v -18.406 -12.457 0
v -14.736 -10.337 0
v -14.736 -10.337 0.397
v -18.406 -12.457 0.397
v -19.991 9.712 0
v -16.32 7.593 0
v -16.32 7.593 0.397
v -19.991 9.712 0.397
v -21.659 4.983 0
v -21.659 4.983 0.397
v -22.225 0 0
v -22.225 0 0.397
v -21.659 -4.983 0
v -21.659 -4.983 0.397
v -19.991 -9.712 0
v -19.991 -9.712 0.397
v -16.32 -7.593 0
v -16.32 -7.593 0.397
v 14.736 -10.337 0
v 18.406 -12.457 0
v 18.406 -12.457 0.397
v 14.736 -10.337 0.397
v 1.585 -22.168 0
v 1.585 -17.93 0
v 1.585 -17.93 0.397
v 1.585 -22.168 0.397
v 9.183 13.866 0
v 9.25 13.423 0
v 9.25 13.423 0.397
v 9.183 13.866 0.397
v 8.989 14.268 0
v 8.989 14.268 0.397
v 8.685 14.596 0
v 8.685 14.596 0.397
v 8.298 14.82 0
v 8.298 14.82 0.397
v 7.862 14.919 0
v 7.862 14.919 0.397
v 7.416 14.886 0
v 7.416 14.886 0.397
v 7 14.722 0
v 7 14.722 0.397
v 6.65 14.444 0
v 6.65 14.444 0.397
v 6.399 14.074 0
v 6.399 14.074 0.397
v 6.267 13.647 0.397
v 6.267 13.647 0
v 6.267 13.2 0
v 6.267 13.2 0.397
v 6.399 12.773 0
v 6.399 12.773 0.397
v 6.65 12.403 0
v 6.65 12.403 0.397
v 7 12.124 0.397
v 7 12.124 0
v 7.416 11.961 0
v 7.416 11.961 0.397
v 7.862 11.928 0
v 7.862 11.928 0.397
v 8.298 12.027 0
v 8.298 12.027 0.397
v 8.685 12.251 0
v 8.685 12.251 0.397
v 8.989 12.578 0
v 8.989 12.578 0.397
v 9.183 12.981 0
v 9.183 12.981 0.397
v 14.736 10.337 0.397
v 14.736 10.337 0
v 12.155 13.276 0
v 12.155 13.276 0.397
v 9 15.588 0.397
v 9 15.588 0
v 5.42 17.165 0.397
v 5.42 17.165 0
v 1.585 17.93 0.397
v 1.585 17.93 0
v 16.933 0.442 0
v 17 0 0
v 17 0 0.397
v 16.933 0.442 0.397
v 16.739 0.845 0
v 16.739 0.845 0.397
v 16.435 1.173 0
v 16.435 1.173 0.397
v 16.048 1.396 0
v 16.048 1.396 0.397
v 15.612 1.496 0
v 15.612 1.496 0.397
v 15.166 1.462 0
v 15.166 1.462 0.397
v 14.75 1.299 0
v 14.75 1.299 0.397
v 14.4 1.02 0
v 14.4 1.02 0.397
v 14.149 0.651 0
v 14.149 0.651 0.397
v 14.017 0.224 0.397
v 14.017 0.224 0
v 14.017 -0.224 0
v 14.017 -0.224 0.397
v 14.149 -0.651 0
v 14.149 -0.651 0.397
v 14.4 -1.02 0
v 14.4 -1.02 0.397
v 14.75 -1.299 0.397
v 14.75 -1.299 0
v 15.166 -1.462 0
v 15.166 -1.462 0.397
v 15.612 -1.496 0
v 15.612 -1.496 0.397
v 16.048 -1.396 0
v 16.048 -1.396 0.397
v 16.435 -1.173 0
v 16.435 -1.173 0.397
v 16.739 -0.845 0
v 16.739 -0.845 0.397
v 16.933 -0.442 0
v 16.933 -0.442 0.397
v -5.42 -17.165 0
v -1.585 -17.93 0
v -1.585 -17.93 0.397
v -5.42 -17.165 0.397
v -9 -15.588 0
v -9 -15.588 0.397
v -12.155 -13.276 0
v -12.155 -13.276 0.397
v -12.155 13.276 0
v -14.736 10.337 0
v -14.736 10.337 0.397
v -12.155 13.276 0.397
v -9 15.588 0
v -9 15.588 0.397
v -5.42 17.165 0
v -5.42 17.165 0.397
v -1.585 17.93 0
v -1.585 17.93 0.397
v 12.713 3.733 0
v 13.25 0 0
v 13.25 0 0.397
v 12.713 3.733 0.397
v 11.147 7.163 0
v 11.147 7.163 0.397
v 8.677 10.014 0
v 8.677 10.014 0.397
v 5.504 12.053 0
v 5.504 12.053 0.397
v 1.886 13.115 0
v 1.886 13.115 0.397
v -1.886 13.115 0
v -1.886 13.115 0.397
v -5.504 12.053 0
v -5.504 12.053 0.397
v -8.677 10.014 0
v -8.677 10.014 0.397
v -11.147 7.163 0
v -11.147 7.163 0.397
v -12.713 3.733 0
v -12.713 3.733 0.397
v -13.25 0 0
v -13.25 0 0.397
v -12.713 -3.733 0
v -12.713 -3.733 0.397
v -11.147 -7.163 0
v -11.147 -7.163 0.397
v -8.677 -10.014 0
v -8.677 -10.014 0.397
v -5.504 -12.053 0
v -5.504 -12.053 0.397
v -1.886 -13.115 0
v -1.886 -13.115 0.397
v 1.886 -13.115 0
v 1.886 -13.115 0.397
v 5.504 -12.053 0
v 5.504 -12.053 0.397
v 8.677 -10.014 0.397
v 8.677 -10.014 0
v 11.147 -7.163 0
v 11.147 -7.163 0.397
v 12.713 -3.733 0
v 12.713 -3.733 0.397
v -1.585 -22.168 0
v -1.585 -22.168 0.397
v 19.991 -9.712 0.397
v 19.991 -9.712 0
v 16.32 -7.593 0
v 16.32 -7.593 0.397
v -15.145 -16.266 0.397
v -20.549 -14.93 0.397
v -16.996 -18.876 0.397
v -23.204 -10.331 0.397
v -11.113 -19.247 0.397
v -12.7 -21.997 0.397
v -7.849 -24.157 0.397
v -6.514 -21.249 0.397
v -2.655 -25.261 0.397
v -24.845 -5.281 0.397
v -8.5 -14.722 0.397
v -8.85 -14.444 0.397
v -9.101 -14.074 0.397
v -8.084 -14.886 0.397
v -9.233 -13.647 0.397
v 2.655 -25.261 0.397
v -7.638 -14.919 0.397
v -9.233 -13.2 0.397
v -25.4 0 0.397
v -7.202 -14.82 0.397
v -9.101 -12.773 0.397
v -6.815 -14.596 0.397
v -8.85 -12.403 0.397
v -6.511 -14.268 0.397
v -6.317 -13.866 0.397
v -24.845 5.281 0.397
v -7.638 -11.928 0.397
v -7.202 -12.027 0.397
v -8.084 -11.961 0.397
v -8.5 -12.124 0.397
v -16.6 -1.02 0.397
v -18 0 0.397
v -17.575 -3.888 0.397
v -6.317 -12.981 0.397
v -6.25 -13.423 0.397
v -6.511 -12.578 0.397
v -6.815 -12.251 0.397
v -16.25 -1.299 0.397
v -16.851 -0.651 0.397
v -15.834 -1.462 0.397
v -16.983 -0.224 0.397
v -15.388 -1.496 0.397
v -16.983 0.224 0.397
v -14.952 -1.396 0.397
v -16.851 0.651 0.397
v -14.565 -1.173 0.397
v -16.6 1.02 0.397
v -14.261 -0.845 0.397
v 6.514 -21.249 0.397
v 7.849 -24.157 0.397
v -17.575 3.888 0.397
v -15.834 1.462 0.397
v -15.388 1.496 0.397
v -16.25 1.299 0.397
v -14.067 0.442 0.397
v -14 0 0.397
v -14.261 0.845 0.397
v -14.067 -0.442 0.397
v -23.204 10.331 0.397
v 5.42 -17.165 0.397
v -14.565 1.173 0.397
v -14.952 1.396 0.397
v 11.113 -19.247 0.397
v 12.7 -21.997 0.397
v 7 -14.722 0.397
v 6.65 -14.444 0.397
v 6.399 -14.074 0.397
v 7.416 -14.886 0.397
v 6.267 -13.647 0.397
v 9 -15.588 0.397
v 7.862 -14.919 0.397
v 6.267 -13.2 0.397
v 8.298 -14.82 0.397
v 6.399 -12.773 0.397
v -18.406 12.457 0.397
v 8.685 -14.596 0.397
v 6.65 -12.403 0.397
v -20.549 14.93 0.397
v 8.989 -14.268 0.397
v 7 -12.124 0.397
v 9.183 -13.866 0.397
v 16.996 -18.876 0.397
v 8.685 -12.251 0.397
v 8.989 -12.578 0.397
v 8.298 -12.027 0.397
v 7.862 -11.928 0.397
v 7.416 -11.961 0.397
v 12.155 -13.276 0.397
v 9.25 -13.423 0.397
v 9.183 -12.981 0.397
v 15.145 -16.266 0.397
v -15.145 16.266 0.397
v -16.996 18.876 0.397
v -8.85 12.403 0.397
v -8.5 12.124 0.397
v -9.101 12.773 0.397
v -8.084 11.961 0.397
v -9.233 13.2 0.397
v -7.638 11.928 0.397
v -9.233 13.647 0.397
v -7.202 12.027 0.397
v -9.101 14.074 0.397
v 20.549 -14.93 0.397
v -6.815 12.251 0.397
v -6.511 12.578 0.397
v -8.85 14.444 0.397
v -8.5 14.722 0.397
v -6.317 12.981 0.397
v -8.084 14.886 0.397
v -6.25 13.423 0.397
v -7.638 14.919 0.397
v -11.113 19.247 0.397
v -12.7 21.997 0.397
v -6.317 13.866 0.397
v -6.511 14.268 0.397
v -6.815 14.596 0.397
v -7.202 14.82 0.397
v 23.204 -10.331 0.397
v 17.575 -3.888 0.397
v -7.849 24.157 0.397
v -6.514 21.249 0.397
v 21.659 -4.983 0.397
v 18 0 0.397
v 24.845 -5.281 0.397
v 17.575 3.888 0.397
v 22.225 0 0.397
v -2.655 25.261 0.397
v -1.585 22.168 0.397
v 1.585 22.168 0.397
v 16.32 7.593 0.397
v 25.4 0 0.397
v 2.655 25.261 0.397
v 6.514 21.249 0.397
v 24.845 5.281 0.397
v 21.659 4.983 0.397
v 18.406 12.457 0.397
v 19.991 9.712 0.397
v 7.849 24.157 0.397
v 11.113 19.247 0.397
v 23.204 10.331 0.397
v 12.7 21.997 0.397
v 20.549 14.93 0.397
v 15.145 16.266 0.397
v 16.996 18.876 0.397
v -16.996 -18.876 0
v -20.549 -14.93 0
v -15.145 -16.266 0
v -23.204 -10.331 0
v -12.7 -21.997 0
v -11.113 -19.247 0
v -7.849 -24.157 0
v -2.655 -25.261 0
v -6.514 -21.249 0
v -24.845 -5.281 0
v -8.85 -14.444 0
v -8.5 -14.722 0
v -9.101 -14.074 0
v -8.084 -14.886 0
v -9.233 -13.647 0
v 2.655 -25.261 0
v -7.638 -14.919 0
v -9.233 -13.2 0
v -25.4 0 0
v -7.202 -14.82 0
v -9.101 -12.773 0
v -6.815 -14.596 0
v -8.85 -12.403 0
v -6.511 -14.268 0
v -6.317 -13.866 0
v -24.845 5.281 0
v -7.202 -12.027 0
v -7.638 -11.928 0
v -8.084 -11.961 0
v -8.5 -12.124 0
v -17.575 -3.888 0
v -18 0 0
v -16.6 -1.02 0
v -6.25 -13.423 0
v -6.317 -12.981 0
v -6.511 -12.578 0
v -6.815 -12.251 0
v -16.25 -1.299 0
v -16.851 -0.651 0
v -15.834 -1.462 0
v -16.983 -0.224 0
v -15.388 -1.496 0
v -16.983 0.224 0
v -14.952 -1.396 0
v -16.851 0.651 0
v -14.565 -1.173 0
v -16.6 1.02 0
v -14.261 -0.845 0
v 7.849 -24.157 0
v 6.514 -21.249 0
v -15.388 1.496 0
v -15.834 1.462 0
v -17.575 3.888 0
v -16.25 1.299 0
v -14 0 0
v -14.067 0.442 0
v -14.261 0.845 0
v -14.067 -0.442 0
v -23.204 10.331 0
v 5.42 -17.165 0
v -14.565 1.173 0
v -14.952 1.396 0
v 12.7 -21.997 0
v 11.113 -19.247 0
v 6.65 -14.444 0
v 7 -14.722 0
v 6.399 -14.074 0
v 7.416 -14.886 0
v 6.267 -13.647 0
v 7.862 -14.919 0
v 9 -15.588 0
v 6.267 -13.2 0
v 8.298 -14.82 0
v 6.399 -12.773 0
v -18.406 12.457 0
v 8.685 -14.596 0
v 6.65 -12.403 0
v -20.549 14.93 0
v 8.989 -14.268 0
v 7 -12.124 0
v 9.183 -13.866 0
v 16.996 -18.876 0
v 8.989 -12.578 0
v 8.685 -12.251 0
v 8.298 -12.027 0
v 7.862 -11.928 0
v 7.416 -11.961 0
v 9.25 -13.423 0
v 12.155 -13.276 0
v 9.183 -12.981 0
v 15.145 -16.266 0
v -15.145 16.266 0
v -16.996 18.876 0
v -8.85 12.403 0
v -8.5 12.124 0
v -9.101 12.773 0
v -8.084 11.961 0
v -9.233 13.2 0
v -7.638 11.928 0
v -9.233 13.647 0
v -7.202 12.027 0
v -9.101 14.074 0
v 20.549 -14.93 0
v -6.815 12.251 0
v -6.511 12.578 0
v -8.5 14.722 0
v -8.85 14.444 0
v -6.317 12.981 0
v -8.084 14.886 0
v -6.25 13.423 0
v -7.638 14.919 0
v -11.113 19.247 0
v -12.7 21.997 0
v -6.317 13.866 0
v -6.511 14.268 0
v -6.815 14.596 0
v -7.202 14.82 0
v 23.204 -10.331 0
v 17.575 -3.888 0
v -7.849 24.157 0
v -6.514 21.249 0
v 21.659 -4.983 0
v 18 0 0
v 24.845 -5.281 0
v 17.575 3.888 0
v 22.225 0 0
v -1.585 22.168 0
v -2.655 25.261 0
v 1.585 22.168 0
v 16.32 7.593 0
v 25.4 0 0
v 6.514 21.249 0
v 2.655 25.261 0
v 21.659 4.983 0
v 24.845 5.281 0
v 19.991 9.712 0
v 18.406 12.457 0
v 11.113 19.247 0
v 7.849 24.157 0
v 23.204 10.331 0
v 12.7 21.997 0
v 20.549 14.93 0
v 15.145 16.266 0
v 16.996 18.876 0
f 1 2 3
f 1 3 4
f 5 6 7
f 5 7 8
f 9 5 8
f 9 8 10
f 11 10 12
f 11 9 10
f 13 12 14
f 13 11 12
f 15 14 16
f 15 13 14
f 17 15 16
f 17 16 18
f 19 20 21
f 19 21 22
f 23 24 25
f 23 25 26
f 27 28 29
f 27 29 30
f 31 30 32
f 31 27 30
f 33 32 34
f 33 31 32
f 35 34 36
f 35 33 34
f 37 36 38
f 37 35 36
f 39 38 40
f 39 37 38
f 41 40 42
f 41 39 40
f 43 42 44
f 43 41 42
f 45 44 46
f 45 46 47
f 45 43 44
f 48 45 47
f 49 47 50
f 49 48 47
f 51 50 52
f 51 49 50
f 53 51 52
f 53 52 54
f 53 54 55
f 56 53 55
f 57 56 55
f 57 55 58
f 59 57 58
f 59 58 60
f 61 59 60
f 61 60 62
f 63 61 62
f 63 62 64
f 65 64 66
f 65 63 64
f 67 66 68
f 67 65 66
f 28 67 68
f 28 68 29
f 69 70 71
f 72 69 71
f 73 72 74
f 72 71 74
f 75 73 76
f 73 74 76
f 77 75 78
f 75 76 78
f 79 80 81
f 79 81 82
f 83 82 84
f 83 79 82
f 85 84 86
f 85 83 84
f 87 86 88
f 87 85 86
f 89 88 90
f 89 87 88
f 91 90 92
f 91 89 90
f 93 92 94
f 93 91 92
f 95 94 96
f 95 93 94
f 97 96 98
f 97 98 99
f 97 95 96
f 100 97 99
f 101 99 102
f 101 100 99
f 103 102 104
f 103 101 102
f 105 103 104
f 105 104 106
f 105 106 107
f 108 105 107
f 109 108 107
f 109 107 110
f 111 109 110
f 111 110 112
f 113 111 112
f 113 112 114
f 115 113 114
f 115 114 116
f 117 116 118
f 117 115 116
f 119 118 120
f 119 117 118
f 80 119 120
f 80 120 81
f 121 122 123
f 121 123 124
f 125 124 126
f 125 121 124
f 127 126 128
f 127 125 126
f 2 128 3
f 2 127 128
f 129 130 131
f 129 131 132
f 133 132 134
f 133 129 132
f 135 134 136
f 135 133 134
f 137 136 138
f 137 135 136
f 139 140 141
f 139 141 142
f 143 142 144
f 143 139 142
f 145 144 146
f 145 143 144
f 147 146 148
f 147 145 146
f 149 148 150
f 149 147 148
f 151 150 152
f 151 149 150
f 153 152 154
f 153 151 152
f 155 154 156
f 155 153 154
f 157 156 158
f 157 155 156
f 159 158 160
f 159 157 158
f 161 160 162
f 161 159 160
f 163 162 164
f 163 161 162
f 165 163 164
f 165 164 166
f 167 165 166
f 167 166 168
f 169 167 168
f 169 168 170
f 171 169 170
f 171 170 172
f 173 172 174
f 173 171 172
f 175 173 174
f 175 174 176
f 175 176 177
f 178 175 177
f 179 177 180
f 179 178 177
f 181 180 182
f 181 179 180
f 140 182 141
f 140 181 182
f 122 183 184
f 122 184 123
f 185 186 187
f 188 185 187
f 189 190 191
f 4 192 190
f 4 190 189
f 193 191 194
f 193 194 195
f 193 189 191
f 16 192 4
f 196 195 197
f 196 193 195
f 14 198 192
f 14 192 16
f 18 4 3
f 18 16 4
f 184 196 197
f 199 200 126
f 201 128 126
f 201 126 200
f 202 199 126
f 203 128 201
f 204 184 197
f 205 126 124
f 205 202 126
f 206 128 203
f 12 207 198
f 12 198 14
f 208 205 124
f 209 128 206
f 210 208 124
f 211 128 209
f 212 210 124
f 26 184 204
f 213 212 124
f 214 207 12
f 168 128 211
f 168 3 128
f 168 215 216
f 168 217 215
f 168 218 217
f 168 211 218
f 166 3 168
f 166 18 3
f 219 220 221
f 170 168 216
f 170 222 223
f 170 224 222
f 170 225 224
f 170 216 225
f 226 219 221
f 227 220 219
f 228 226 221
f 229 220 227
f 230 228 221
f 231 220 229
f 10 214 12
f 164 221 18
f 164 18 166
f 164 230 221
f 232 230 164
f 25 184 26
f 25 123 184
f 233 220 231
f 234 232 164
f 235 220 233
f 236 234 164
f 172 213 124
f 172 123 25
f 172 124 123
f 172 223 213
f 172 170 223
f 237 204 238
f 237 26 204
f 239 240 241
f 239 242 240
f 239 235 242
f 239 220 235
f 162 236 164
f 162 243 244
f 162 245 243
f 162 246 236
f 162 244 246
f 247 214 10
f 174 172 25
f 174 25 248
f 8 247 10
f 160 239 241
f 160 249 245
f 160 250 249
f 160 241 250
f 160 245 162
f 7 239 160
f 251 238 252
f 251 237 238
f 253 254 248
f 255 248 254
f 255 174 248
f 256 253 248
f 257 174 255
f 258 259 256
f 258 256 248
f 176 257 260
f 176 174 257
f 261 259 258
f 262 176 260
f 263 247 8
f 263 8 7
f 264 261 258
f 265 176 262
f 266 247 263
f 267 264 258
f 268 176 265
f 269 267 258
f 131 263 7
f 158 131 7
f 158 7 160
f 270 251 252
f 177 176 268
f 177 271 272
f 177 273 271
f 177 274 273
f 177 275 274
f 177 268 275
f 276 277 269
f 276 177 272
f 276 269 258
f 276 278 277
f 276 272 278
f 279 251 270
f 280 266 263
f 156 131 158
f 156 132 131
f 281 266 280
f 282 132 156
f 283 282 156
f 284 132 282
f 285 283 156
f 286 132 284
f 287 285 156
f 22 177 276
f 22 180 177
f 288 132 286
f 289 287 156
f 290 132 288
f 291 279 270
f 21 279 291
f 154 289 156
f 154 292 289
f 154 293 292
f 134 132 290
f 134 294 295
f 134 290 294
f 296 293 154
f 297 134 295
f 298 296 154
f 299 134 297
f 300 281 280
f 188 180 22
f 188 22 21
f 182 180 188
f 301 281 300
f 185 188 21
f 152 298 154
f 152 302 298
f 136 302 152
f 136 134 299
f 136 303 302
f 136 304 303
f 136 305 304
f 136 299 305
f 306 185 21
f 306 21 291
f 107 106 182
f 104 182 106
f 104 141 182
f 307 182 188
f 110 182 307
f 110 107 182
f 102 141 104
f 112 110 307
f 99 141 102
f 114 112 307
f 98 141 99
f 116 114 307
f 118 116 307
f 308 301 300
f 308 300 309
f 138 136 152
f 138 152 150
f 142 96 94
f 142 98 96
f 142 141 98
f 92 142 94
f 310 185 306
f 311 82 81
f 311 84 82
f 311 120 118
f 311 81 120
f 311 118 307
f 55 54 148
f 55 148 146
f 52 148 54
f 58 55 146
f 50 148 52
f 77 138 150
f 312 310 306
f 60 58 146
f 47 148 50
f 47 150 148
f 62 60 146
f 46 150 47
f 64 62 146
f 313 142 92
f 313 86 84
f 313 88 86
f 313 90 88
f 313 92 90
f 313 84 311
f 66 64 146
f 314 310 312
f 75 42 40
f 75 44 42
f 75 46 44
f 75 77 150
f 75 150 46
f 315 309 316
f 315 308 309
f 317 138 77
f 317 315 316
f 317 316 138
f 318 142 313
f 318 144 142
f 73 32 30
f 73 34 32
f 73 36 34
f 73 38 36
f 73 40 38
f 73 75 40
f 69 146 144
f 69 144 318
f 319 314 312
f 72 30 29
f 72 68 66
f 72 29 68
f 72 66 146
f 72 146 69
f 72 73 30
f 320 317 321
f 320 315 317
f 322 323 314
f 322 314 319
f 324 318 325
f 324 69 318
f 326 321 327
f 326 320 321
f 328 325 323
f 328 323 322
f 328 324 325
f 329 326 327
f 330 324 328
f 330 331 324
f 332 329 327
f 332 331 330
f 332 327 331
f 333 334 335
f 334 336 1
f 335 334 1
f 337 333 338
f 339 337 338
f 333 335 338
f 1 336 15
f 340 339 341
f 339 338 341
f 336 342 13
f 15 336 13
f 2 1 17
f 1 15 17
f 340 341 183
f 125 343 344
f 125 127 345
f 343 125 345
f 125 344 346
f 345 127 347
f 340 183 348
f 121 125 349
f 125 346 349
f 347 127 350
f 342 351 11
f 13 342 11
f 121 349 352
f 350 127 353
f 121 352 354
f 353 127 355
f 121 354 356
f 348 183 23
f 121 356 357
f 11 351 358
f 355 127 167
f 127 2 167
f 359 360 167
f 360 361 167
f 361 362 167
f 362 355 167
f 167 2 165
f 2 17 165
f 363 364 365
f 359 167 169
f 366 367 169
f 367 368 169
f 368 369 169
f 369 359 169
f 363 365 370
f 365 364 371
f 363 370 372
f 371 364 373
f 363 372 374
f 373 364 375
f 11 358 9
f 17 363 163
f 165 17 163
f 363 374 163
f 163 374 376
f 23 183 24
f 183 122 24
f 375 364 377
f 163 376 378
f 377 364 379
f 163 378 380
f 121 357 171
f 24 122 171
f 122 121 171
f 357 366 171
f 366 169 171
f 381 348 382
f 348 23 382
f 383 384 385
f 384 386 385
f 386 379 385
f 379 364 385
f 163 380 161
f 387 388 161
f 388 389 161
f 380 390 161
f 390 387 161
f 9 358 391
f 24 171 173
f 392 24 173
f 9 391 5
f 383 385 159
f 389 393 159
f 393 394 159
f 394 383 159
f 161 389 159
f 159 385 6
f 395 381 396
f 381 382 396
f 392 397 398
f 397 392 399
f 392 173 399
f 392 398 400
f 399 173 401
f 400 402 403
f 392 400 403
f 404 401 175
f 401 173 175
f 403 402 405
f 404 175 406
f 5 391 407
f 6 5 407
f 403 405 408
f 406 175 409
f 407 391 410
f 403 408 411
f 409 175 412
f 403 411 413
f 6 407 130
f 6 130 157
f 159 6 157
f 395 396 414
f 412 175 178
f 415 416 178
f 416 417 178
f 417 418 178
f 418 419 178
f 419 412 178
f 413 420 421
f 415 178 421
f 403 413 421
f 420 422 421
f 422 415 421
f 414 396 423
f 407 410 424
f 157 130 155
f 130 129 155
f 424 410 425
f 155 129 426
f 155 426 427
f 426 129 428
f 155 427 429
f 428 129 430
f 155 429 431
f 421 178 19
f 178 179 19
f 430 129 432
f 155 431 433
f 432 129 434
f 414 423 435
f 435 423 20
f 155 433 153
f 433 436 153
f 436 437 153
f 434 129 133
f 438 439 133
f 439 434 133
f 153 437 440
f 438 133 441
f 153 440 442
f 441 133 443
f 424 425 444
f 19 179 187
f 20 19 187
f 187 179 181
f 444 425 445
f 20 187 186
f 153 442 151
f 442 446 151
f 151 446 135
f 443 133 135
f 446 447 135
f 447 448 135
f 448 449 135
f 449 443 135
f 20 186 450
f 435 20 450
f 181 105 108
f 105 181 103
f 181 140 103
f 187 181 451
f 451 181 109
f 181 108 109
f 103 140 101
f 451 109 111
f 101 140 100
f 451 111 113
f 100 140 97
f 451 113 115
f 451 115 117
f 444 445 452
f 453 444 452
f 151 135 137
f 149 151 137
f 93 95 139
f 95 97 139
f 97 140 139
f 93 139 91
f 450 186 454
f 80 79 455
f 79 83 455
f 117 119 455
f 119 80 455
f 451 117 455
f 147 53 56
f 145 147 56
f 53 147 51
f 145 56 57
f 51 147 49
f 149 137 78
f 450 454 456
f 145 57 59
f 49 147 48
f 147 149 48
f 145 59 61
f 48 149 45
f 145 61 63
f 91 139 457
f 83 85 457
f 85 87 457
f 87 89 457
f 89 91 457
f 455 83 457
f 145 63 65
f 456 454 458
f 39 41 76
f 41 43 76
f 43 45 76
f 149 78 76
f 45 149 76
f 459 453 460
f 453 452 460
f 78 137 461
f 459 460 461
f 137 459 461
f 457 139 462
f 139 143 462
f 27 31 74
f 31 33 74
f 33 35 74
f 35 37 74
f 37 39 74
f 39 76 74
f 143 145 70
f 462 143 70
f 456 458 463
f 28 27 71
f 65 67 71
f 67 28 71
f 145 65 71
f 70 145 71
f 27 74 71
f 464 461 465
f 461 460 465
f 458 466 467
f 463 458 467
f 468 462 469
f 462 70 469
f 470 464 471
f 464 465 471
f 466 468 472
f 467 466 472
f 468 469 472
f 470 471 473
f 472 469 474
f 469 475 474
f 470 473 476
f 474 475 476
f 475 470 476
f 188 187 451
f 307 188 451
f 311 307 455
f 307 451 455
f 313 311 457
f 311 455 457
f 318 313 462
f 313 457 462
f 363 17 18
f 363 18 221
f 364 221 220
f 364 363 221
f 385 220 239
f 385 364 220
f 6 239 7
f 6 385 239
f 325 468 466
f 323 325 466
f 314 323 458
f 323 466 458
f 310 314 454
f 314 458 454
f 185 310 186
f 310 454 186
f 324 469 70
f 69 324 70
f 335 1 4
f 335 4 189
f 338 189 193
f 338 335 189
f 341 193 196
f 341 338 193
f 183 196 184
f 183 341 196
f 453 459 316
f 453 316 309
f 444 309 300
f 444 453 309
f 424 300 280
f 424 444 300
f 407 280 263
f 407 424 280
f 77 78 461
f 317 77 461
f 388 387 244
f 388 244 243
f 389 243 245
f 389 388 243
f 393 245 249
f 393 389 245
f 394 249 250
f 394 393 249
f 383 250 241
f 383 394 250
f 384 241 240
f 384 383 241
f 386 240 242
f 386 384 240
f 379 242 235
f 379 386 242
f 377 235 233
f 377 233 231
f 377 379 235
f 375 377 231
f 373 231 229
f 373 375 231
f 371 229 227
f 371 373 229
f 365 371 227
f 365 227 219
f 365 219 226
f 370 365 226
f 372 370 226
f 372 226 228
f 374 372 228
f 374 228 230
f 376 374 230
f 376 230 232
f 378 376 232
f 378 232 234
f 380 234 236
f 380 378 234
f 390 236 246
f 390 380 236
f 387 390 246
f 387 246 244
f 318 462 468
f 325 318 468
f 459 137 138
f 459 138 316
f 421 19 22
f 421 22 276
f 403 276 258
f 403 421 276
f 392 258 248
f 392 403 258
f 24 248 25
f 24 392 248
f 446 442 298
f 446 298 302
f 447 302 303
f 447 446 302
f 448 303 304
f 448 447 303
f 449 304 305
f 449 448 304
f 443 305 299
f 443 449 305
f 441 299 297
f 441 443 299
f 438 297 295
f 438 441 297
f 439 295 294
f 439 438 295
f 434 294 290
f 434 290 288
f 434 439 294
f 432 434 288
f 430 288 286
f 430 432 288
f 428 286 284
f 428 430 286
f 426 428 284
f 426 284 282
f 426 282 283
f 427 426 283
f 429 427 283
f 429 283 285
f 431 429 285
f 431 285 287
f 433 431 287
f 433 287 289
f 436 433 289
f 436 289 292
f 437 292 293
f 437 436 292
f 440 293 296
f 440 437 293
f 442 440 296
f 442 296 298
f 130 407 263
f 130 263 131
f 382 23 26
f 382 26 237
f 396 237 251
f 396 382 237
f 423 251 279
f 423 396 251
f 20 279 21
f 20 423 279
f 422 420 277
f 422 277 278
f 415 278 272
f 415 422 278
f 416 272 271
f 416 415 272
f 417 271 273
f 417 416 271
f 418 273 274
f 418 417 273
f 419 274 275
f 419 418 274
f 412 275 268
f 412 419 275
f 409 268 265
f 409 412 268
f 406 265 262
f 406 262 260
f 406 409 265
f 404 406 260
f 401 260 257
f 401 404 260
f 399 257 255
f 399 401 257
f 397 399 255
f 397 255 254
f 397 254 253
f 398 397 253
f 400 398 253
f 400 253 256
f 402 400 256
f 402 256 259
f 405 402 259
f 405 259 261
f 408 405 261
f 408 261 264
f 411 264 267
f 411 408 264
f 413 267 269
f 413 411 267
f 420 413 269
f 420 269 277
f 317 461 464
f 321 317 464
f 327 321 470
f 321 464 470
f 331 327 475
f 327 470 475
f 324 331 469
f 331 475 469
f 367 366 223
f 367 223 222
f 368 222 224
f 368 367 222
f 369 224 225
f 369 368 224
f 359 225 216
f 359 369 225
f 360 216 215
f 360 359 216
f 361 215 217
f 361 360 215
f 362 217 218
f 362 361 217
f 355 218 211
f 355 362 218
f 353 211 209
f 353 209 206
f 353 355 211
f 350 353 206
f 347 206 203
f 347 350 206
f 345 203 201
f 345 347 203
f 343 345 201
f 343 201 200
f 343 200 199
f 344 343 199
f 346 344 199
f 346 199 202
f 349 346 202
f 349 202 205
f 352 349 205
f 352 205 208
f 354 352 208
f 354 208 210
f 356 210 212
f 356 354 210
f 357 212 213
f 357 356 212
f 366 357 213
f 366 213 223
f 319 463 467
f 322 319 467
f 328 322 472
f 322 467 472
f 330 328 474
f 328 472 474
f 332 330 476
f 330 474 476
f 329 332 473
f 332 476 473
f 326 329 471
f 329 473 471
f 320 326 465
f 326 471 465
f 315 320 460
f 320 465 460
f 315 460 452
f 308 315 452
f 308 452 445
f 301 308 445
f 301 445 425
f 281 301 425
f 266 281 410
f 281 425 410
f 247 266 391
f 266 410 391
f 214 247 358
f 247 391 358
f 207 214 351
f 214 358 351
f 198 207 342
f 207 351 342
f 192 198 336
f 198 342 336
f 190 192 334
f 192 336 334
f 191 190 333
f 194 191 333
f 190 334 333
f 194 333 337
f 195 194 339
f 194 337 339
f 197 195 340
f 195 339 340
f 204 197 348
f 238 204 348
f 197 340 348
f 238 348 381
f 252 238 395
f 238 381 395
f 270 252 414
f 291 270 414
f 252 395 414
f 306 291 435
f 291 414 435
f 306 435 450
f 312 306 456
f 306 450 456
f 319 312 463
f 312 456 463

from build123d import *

# Parameters (mm, degrees)
SKETCH1_R           = 25.4
SKETCH1_R_2         = 1.5
SKETCH1_R_3         = 13.25
BOSS_EXTRUDE1_DEPTH = 0.396875


with BuildPart() as part:
    # Sketch1 → Boss-Extrude1 (new body)
    with BuildSketch(Plane.XY):
        Circle(SKETCH1_R)
        with Locations((-15.5, 0)):
            Circle(SKETCH1_R_2, mode=Mode.SUBTRACT)
        with Locations((-7.75, 13.423393759)):
            Circle(SKETCH1_R_2, mode=Mode.SUBTRACT)
        with Locations((7.75, 13.423393759)):
            Circle(SKETCH1_R_2, mode=Mode.SUBTRACT)
        with Locations((15.5, 0)):
            Circle(SKETCH1_R_2, mode=Mode.SUBTRACT)
        with Locations((7.75, -13.423393759)):
            Circle(SKETCH1_R_2, mode=Mode.SUBTRACT)
        with Locations((-7.75, -13.423393759)):
            Circle(SKETCH1_R_2, mode=Mode.SUBTRACT)
        Circle(SKETCH1_R_3, mode=Mode.SUBTRACT)
        with BuildLine():
            Line((-1.584648919, 17.930111204), (-1.584648919, 22.168435055))
            ThreePointArc((-1.584648919, 22.168435055), (-11.1125, 19.247414599), (-18.406103461, 12.456563747))
            Line((-18.406103461, 12.456563747), (-14.735607336, 10.337401822))
            ThreePointArc((-14.735607336, 10.337401822), (-9, 15.588457268), (-1.584648919, 17.930111204))
        make_face(mode=Mode.SUBTRACT)
        with BuildLine():
            Line((1.584648919, 17.930111204), (1.584648919, 22.168435055))
            ThreePointArc((1.584648919, 22.168435055), (11.1125, 19.247414599), (18.406103461, 12.456563747))
            Line((18.406103461, 12.456563747), (14.735607336, 10.337401822))
            ThreePointArc((14.735607336, 10.337401822), (9, 15.588457268), (1.584648919, 17.930111204))
        make_face(mode=Mode.SUBTRACT)
        with BuildLine():
            Line((16.320256255, 7.592709383), (19.990752379, 9.711871308))
            ThreePointArc((19.990752379, 9.711871308), (22.225, 0), (19.990752379, -9.711871308))
            Line((19.990752379, -9.711871308), (16.320256255, -7.592709383))
            ThreePointArc((16.320256255, -7.592709383), (18, 0), (16.320256255, 7.592709383))
        make_face(mode=Mode.SUBTRACT)
        with BuildLine():
            Line((-16.320256255, 7.592709383), (-19.990752379, 9.711871308))
            ThreePointArc((-19.990752379, 9.711871308), (-22.225, 0), (-19.990752379, -9.711871308))
            Line((-19.990752379, -9.711871308), (-16.320256255, -7.592709383))
            ThreePointArc((-16.320256255, -7.592709383), (-18, 0), (-16.320256255, 7.592709383))
        make_face(mode=Mode.SUBTRACT)
        with BuildLine():
            Line((-14.735607336, -10.337401822), (-18.406103461, -12.456563747))
            ThreePointArc((-18.406103461, -12.456563747), (-11.1125, -19.247414599), (-1.584648919, -22.168435055))
            Line((-1.584648919, -22.168435055), (-1.584648919, -17.930111204))
            ThreePointArc((-1.584648919, -17.930111204), (-9, -15.588457268), (-14.735607336, -10.337401822))
        make_face(mode=Mode.SUBTRACT)
        with BuildLine():
            Line((1.584648919, -17.930111204), (1.584648919, -22.168435055))
            ThreePointArc((1.584648919, -22.168435055), (11.1125, -19.247414599), (18.406103461, -12.456563747))
            Line((18.406103461, -12.456563747), (14.735607336, -10.337401822))
            ThreePointArc((14.735607336, -10.337401822), (9, -15.588457268), (1.584648919, -17.930111204))
        make_face(mode=Mode.SUBTRACT)
    extrude(amount=BOSS_EXTRUDE1_DEPTH)


solid = part.part
